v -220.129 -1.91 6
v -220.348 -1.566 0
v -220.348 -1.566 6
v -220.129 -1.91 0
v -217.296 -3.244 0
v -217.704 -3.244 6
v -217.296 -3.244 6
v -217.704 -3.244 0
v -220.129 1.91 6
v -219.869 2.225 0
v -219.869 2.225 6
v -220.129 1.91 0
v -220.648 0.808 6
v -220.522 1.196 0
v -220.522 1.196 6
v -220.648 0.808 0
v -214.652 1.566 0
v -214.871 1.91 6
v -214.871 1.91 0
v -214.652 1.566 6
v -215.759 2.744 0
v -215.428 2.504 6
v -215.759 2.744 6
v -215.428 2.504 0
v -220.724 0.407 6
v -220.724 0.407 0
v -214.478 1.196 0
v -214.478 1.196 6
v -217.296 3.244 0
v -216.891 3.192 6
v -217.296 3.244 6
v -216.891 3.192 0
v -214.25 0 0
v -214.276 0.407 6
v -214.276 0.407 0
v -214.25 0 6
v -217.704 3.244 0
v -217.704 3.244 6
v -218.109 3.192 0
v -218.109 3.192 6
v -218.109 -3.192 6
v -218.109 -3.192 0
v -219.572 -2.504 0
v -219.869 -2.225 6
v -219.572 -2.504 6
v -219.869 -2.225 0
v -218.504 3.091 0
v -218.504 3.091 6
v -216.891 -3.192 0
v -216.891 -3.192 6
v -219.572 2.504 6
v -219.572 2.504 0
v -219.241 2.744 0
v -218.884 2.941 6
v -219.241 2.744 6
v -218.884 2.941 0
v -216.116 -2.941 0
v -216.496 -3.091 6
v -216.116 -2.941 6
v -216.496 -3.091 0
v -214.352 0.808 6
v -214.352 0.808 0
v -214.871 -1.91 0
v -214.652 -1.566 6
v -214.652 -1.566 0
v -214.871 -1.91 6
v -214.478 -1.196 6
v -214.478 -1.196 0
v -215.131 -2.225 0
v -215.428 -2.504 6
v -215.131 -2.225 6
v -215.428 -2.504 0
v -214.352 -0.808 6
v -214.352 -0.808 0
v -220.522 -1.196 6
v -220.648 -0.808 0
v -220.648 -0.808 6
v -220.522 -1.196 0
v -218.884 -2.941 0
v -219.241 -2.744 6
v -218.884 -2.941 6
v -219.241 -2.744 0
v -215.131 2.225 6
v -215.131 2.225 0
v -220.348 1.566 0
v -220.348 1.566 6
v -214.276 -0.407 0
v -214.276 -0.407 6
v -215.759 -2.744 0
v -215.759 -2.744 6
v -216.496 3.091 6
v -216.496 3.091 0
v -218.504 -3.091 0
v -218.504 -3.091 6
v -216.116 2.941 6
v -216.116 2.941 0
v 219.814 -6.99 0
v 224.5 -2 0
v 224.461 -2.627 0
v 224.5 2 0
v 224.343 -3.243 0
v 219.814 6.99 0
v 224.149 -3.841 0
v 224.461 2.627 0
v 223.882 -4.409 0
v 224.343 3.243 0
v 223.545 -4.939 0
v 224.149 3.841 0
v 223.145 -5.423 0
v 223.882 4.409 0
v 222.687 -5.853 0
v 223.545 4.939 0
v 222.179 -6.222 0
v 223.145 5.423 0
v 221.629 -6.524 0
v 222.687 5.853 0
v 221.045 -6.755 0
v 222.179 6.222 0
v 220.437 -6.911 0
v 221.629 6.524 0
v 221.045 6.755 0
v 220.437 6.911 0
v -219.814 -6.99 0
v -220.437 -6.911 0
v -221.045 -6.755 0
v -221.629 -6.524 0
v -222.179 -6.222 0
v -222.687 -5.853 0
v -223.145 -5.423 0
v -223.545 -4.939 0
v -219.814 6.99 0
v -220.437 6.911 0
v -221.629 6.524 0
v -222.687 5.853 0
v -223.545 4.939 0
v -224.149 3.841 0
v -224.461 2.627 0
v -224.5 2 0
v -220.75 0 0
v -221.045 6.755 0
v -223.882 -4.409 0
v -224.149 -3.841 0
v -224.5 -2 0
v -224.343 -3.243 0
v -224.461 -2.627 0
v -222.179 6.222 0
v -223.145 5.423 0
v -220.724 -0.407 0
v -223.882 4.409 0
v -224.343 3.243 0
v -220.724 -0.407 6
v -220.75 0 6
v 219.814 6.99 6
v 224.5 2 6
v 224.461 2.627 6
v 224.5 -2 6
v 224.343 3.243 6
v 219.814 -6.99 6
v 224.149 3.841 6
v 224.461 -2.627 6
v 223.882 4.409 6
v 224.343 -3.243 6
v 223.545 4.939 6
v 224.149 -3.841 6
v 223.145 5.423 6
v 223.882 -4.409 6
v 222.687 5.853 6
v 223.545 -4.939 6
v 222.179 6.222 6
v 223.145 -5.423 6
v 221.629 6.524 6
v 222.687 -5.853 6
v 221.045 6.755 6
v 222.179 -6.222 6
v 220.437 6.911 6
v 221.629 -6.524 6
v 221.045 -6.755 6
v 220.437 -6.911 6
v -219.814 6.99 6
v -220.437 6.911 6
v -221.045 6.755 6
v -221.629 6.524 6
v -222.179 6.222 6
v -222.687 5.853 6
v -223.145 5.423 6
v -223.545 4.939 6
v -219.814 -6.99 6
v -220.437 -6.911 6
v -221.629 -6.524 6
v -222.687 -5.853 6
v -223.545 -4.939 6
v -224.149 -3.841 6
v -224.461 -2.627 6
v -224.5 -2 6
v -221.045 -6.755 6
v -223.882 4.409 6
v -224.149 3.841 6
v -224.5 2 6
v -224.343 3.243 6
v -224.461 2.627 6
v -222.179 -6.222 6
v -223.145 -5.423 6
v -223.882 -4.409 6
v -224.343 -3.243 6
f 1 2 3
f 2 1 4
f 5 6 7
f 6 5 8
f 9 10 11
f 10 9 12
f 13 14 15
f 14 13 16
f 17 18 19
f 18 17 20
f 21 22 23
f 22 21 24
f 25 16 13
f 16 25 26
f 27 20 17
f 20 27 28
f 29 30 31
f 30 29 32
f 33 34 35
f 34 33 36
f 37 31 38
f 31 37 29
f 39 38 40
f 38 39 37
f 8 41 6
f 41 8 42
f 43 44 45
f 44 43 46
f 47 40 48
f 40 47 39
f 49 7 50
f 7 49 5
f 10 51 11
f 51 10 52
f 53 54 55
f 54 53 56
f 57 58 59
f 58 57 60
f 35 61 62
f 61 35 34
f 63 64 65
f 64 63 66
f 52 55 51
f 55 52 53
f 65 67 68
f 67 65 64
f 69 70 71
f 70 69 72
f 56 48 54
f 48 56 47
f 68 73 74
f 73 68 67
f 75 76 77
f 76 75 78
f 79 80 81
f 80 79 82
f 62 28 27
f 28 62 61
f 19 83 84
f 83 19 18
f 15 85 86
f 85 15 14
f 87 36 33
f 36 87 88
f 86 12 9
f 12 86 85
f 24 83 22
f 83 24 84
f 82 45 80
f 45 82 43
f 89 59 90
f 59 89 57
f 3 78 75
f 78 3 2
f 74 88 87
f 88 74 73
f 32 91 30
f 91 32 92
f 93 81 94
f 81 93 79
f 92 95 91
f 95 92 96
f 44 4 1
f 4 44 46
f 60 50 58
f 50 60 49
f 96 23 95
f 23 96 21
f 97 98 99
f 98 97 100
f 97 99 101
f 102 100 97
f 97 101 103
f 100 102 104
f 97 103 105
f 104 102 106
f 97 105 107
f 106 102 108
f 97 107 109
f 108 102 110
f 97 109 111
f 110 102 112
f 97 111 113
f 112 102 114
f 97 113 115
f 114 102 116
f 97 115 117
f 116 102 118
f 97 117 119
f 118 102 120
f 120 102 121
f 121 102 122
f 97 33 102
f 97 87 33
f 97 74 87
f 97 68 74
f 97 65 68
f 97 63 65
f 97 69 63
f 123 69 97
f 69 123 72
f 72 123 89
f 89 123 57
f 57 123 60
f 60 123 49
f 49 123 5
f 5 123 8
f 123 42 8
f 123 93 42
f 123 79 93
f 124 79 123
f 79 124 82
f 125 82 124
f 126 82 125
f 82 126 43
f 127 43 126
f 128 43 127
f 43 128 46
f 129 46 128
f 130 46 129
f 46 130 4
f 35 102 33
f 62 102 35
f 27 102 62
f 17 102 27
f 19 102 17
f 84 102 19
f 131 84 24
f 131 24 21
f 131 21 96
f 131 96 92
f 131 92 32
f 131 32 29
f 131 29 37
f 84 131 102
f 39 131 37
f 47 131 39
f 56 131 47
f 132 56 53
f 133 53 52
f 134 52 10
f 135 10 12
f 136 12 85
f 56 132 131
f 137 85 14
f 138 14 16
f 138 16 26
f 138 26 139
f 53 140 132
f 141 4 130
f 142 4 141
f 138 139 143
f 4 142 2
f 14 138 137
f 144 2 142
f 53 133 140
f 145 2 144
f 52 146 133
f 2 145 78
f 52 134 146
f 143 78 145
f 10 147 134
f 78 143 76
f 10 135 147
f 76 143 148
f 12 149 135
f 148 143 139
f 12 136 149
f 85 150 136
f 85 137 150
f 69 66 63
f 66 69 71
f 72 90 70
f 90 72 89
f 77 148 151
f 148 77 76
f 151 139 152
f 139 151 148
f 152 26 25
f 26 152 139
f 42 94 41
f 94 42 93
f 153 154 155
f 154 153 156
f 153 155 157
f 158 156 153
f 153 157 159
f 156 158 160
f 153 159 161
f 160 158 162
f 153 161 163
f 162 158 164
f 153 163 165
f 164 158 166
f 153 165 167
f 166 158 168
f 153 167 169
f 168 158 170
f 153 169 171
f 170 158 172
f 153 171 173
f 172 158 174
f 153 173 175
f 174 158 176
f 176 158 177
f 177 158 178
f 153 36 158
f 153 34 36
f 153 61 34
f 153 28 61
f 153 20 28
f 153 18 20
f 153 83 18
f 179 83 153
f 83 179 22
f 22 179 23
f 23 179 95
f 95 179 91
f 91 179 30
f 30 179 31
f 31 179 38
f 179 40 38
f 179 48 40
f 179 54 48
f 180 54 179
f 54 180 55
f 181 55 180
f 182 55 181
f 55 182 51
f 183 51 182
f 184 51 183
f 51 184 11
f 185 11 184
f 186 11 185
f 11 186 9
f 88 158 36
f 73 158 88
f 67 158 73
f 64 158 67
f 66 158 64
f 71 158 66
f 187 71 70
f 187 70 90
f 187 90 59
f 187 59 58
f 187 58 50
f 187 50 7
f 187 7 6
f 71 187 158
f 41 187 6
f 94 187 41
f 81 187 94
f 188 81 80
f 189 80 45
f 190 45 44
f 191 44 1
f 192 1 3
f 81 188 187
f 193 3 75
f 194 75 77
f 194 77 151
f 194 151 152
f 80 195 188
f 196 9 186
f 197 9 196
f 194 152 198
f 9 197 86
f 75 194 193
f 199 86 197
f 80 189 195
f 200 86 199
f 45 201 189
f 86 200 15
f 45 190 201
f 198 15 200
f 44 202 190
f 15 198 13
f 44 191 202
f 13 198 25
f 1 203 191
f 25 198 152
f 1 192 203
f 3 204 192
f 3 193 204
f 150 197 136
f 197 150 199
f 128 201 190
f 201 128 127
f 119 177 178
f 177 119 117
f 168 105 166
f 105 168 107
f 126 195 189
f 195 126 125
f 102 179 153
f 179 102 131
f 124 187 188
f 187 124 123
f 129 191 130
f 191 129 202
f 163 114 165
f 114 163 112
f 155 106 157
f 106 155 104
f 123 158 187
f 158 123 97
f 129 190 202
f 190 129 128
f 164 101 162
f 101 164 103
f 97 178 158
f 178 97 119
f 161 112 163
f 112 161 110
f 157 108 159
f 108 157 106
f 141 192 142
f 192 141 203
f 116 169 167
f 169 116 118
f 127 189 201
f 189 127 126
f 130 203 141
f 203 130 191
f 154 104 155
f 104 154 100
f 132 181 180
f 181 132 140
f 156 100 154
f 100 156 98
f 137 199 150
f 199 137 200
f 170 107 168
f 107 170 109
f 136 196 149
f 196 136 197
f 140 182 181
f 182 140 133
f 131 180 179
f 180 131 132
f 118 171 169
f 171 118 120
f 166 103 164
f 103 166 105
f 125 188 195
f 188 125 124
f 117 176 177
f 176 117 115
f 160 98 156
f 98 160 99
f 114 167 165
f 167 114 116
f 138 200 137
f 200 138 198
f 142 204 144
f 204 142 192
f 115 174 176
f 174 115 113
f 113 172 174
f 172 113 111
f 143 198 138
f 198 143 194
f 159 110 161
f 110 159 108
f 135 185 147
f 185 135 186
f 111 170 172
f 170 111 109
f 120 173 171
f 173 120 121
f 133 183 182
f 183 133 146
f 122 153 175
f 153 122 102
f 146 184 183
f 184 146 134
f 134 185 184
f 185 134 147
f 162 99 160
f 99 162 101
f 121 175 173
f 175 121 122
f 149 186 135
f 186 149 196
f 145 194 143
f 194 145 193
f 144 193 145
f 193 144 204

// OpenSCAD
$fn = 50;


difference() {
	union() {
		hull() {
			translate(v = [-219.5000000000, 2.0000000000, 0]) {
				cylinder(h = 6, r = 5);
			}
			translate(v = [219.5000000000, 2.0000000000, 0]) {
				cylinder(h = 6, r = 5);
			}
			translate(v = [-219.5000000000, -2.0000000000, 0]) {
				cylinder(h = 6, r = 5);
			}
			translate(v = [219.5000000000, -2.0000000000, 0]) {
				cylinder(h = 6, r = 5);
			}
		}
	}
	union() {
		translate(v = [-217.5000000000, 0.0000000000, 0]) {
			cylinder(h = 6, r = 3.2500000000);
		}
		translate(v = [-217.5000000000, 0.0000000000, 0]) {
			cylinder(h = 6, r = 1.8000000000);
		}
		translate(v = [-217.5000000000, 0.0000000000, 0]) {
			cylinder(h = 6, r = 1.8000000000);
		}
		translate(v = [-217.5000000000, 0.0000000000, 0]) {
			cylinder(h = 6, r = 1.8000000000);
		}
	}
}
